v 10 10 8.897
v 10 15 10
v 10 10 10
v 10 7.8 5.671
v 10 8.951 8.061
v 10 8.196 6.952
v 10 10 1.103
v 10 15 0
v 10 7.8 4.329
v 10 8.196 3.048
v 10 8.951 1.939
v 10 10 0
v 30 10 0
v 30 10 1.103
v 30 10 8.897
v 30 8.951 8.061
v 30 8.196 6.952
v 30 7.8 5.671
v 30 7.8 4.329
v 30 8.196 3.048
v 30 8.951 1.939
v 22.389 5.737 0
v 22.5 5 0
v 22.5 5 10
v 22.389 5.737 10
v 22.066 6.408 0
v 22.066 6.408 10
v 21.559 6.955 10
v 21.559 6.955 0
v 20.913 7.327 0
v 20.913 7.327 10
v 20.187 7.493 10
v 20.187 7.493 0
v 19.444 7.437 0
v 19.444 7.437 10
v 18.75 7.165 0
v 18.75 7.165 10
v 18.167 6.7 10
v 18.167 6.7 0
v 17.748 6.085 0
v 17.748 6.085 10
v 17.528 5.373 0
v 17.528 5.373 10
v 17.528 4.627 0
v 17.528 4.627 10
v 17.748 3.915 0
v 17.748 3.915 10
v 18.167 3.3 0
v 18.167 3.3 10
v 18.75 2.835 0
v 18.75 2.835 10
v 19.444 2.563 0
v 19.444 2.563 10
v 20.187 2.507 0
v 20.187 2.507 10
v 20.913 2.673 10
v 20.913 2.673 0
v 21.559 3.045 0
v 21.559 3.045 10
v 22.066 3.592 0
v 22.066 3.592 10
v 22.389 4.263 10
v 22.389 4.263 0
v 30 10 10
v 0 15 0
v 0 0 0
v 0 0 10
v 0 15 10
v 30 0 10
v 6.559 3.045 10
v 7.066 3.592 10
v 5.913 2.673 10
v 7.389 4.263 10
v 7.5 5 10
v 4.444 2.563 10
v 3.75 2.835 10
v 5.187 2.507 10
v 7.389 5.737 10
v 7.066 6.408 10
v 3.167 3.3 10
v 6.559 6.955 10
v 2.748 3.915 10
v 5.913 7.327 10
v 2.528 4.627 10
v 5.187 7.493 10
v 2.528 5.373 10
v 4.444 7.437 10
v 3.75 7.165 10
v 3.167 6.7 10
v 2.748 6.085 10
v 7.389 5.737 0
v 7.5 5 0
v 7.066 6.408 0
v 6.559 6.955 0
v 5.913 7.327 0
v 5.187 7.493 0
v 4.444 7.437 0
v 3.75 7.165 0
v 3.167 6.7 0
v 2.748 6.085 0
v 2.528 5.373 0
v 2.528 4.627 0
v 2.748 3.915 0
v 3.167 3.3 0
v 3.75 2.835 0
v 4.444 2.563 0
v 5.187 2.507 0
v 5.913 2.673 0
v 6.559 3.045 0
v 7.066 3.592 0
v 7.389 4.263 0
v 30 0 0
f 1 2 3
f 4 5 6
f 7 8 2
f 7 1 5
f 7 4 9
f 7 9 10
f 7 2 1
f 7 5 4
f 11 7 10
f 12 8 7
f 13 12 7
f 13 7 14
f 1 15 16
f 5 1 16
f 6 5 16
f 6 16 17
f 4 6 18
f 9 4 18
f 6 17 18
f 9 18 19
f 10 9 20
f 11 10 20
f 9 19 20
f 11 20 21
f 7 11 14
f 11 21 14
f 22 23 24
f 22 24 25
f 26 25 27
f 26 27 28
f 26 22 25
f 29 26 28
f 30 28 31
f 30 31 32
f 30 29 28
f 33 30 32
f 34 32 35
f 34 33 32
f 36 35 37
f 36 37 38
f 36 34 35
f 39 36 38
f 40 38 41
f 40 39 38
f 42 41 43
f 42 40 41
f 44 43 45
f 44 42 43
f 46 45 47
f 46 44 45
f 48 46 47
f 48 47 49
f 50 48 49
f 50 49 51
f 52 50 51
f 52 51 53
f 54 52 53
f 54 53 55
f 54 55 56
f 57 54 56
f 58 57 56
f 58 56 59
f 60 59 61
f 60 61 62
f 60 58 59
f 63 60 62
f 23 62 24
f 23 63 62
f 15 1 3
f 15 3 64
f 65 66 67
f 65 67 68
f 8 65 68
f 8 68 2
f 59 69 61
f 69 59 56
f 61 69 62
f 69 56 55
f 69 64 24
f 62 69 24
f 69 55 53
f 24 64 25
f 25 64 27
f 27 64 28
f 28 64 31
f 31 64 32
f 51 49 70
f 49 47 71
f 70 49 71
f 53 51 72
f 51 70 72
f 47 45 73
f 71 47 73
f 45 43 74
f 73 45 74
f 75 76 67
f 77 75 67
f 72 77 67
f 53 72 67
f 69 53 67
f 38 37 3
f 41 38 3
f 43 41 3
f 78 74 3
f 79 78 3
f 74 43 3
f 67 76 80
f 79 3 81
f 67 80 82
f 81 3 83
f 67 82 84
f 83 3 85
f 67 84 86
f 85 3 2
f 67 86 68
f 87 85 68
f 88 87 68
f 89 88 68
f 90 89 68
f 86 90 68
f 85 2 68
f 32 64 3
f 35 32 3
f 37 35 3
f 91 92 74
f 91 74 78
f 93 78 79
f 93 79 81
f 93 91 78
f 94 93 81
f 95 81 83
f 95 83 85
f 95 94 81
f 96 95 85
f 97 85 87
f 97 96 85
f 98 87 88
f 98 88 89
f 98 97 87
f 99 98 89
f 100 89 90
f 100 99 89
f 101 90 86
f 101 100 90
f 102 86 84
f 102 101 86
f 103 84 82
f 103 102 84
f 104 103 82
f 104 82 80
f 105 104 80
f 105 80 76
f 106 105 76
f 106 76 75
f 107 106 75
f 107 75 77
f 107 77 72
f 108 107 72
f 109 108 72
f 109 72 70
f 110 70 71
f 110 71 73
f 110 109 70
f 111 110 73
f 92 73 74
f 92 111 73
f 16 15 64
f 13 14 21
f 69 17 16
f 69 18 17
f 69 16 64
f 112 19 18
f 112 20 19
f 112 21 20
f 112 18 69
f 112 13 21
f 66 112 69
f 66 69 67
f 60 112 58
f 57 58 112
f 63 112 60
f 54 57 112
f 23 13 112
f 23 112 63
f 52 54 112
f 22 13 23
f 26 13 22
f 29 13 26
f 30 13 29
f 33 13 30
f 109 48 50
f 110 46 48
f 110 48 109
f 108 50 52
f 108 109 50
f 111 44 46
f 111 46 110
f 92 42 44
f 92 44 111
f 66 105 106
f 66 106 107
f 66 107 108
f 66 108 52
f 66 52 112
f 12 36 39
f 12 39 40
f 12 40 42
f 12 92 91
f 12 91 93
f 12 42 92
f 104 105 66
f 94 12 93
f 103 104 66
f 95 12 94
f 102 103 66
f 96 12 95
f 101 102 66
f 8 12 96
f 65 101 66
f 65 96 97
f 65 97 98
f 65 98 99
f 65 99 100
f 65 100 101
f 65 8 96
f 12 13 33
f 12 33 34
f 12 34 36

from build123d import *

# Parameters (mm, degrees)
SKETCH_1_R          = 2.5
EXTRUDE_1_DEPTH     = 10
SKETCH_2_R          = 4.5
CUT_EXTRUDE_2_DEPTH = 20


with BuildPart() as part:
    # 草圖1 → 填料-伸長1 (new body)
    with BuildSketch(Plane.XY):
        Polygon((0, 0), (0, 15), (10, 15), (10, 10), (30, 10), (30, 0), align=None)
        with Locations((5, 5)):
            Circle(SKETCH_1_R, mode=Mode.SUBTRACT)
        with Locations((20, 5)):
            Circle(SKETCH_1_R, mode=Mode.SUBTRACT)
    extrude(amount=EXTRUDE_1_DEPTH)

    # 草圖2 → 除料-伸長2 (cut)
    with BuildSketch(Plane(origin=(30, 0, 0), x_dir=(0, 0, -1), z_dir=(1, 0, 0))):
        with Locations((-5, 12.25)):
            Circle(SKETCH_2_R)
    extrude(amount=-CUT_EXTRUDE_2_DEPTH, mode=Mode.SUBTRACT)


solid = part.part
